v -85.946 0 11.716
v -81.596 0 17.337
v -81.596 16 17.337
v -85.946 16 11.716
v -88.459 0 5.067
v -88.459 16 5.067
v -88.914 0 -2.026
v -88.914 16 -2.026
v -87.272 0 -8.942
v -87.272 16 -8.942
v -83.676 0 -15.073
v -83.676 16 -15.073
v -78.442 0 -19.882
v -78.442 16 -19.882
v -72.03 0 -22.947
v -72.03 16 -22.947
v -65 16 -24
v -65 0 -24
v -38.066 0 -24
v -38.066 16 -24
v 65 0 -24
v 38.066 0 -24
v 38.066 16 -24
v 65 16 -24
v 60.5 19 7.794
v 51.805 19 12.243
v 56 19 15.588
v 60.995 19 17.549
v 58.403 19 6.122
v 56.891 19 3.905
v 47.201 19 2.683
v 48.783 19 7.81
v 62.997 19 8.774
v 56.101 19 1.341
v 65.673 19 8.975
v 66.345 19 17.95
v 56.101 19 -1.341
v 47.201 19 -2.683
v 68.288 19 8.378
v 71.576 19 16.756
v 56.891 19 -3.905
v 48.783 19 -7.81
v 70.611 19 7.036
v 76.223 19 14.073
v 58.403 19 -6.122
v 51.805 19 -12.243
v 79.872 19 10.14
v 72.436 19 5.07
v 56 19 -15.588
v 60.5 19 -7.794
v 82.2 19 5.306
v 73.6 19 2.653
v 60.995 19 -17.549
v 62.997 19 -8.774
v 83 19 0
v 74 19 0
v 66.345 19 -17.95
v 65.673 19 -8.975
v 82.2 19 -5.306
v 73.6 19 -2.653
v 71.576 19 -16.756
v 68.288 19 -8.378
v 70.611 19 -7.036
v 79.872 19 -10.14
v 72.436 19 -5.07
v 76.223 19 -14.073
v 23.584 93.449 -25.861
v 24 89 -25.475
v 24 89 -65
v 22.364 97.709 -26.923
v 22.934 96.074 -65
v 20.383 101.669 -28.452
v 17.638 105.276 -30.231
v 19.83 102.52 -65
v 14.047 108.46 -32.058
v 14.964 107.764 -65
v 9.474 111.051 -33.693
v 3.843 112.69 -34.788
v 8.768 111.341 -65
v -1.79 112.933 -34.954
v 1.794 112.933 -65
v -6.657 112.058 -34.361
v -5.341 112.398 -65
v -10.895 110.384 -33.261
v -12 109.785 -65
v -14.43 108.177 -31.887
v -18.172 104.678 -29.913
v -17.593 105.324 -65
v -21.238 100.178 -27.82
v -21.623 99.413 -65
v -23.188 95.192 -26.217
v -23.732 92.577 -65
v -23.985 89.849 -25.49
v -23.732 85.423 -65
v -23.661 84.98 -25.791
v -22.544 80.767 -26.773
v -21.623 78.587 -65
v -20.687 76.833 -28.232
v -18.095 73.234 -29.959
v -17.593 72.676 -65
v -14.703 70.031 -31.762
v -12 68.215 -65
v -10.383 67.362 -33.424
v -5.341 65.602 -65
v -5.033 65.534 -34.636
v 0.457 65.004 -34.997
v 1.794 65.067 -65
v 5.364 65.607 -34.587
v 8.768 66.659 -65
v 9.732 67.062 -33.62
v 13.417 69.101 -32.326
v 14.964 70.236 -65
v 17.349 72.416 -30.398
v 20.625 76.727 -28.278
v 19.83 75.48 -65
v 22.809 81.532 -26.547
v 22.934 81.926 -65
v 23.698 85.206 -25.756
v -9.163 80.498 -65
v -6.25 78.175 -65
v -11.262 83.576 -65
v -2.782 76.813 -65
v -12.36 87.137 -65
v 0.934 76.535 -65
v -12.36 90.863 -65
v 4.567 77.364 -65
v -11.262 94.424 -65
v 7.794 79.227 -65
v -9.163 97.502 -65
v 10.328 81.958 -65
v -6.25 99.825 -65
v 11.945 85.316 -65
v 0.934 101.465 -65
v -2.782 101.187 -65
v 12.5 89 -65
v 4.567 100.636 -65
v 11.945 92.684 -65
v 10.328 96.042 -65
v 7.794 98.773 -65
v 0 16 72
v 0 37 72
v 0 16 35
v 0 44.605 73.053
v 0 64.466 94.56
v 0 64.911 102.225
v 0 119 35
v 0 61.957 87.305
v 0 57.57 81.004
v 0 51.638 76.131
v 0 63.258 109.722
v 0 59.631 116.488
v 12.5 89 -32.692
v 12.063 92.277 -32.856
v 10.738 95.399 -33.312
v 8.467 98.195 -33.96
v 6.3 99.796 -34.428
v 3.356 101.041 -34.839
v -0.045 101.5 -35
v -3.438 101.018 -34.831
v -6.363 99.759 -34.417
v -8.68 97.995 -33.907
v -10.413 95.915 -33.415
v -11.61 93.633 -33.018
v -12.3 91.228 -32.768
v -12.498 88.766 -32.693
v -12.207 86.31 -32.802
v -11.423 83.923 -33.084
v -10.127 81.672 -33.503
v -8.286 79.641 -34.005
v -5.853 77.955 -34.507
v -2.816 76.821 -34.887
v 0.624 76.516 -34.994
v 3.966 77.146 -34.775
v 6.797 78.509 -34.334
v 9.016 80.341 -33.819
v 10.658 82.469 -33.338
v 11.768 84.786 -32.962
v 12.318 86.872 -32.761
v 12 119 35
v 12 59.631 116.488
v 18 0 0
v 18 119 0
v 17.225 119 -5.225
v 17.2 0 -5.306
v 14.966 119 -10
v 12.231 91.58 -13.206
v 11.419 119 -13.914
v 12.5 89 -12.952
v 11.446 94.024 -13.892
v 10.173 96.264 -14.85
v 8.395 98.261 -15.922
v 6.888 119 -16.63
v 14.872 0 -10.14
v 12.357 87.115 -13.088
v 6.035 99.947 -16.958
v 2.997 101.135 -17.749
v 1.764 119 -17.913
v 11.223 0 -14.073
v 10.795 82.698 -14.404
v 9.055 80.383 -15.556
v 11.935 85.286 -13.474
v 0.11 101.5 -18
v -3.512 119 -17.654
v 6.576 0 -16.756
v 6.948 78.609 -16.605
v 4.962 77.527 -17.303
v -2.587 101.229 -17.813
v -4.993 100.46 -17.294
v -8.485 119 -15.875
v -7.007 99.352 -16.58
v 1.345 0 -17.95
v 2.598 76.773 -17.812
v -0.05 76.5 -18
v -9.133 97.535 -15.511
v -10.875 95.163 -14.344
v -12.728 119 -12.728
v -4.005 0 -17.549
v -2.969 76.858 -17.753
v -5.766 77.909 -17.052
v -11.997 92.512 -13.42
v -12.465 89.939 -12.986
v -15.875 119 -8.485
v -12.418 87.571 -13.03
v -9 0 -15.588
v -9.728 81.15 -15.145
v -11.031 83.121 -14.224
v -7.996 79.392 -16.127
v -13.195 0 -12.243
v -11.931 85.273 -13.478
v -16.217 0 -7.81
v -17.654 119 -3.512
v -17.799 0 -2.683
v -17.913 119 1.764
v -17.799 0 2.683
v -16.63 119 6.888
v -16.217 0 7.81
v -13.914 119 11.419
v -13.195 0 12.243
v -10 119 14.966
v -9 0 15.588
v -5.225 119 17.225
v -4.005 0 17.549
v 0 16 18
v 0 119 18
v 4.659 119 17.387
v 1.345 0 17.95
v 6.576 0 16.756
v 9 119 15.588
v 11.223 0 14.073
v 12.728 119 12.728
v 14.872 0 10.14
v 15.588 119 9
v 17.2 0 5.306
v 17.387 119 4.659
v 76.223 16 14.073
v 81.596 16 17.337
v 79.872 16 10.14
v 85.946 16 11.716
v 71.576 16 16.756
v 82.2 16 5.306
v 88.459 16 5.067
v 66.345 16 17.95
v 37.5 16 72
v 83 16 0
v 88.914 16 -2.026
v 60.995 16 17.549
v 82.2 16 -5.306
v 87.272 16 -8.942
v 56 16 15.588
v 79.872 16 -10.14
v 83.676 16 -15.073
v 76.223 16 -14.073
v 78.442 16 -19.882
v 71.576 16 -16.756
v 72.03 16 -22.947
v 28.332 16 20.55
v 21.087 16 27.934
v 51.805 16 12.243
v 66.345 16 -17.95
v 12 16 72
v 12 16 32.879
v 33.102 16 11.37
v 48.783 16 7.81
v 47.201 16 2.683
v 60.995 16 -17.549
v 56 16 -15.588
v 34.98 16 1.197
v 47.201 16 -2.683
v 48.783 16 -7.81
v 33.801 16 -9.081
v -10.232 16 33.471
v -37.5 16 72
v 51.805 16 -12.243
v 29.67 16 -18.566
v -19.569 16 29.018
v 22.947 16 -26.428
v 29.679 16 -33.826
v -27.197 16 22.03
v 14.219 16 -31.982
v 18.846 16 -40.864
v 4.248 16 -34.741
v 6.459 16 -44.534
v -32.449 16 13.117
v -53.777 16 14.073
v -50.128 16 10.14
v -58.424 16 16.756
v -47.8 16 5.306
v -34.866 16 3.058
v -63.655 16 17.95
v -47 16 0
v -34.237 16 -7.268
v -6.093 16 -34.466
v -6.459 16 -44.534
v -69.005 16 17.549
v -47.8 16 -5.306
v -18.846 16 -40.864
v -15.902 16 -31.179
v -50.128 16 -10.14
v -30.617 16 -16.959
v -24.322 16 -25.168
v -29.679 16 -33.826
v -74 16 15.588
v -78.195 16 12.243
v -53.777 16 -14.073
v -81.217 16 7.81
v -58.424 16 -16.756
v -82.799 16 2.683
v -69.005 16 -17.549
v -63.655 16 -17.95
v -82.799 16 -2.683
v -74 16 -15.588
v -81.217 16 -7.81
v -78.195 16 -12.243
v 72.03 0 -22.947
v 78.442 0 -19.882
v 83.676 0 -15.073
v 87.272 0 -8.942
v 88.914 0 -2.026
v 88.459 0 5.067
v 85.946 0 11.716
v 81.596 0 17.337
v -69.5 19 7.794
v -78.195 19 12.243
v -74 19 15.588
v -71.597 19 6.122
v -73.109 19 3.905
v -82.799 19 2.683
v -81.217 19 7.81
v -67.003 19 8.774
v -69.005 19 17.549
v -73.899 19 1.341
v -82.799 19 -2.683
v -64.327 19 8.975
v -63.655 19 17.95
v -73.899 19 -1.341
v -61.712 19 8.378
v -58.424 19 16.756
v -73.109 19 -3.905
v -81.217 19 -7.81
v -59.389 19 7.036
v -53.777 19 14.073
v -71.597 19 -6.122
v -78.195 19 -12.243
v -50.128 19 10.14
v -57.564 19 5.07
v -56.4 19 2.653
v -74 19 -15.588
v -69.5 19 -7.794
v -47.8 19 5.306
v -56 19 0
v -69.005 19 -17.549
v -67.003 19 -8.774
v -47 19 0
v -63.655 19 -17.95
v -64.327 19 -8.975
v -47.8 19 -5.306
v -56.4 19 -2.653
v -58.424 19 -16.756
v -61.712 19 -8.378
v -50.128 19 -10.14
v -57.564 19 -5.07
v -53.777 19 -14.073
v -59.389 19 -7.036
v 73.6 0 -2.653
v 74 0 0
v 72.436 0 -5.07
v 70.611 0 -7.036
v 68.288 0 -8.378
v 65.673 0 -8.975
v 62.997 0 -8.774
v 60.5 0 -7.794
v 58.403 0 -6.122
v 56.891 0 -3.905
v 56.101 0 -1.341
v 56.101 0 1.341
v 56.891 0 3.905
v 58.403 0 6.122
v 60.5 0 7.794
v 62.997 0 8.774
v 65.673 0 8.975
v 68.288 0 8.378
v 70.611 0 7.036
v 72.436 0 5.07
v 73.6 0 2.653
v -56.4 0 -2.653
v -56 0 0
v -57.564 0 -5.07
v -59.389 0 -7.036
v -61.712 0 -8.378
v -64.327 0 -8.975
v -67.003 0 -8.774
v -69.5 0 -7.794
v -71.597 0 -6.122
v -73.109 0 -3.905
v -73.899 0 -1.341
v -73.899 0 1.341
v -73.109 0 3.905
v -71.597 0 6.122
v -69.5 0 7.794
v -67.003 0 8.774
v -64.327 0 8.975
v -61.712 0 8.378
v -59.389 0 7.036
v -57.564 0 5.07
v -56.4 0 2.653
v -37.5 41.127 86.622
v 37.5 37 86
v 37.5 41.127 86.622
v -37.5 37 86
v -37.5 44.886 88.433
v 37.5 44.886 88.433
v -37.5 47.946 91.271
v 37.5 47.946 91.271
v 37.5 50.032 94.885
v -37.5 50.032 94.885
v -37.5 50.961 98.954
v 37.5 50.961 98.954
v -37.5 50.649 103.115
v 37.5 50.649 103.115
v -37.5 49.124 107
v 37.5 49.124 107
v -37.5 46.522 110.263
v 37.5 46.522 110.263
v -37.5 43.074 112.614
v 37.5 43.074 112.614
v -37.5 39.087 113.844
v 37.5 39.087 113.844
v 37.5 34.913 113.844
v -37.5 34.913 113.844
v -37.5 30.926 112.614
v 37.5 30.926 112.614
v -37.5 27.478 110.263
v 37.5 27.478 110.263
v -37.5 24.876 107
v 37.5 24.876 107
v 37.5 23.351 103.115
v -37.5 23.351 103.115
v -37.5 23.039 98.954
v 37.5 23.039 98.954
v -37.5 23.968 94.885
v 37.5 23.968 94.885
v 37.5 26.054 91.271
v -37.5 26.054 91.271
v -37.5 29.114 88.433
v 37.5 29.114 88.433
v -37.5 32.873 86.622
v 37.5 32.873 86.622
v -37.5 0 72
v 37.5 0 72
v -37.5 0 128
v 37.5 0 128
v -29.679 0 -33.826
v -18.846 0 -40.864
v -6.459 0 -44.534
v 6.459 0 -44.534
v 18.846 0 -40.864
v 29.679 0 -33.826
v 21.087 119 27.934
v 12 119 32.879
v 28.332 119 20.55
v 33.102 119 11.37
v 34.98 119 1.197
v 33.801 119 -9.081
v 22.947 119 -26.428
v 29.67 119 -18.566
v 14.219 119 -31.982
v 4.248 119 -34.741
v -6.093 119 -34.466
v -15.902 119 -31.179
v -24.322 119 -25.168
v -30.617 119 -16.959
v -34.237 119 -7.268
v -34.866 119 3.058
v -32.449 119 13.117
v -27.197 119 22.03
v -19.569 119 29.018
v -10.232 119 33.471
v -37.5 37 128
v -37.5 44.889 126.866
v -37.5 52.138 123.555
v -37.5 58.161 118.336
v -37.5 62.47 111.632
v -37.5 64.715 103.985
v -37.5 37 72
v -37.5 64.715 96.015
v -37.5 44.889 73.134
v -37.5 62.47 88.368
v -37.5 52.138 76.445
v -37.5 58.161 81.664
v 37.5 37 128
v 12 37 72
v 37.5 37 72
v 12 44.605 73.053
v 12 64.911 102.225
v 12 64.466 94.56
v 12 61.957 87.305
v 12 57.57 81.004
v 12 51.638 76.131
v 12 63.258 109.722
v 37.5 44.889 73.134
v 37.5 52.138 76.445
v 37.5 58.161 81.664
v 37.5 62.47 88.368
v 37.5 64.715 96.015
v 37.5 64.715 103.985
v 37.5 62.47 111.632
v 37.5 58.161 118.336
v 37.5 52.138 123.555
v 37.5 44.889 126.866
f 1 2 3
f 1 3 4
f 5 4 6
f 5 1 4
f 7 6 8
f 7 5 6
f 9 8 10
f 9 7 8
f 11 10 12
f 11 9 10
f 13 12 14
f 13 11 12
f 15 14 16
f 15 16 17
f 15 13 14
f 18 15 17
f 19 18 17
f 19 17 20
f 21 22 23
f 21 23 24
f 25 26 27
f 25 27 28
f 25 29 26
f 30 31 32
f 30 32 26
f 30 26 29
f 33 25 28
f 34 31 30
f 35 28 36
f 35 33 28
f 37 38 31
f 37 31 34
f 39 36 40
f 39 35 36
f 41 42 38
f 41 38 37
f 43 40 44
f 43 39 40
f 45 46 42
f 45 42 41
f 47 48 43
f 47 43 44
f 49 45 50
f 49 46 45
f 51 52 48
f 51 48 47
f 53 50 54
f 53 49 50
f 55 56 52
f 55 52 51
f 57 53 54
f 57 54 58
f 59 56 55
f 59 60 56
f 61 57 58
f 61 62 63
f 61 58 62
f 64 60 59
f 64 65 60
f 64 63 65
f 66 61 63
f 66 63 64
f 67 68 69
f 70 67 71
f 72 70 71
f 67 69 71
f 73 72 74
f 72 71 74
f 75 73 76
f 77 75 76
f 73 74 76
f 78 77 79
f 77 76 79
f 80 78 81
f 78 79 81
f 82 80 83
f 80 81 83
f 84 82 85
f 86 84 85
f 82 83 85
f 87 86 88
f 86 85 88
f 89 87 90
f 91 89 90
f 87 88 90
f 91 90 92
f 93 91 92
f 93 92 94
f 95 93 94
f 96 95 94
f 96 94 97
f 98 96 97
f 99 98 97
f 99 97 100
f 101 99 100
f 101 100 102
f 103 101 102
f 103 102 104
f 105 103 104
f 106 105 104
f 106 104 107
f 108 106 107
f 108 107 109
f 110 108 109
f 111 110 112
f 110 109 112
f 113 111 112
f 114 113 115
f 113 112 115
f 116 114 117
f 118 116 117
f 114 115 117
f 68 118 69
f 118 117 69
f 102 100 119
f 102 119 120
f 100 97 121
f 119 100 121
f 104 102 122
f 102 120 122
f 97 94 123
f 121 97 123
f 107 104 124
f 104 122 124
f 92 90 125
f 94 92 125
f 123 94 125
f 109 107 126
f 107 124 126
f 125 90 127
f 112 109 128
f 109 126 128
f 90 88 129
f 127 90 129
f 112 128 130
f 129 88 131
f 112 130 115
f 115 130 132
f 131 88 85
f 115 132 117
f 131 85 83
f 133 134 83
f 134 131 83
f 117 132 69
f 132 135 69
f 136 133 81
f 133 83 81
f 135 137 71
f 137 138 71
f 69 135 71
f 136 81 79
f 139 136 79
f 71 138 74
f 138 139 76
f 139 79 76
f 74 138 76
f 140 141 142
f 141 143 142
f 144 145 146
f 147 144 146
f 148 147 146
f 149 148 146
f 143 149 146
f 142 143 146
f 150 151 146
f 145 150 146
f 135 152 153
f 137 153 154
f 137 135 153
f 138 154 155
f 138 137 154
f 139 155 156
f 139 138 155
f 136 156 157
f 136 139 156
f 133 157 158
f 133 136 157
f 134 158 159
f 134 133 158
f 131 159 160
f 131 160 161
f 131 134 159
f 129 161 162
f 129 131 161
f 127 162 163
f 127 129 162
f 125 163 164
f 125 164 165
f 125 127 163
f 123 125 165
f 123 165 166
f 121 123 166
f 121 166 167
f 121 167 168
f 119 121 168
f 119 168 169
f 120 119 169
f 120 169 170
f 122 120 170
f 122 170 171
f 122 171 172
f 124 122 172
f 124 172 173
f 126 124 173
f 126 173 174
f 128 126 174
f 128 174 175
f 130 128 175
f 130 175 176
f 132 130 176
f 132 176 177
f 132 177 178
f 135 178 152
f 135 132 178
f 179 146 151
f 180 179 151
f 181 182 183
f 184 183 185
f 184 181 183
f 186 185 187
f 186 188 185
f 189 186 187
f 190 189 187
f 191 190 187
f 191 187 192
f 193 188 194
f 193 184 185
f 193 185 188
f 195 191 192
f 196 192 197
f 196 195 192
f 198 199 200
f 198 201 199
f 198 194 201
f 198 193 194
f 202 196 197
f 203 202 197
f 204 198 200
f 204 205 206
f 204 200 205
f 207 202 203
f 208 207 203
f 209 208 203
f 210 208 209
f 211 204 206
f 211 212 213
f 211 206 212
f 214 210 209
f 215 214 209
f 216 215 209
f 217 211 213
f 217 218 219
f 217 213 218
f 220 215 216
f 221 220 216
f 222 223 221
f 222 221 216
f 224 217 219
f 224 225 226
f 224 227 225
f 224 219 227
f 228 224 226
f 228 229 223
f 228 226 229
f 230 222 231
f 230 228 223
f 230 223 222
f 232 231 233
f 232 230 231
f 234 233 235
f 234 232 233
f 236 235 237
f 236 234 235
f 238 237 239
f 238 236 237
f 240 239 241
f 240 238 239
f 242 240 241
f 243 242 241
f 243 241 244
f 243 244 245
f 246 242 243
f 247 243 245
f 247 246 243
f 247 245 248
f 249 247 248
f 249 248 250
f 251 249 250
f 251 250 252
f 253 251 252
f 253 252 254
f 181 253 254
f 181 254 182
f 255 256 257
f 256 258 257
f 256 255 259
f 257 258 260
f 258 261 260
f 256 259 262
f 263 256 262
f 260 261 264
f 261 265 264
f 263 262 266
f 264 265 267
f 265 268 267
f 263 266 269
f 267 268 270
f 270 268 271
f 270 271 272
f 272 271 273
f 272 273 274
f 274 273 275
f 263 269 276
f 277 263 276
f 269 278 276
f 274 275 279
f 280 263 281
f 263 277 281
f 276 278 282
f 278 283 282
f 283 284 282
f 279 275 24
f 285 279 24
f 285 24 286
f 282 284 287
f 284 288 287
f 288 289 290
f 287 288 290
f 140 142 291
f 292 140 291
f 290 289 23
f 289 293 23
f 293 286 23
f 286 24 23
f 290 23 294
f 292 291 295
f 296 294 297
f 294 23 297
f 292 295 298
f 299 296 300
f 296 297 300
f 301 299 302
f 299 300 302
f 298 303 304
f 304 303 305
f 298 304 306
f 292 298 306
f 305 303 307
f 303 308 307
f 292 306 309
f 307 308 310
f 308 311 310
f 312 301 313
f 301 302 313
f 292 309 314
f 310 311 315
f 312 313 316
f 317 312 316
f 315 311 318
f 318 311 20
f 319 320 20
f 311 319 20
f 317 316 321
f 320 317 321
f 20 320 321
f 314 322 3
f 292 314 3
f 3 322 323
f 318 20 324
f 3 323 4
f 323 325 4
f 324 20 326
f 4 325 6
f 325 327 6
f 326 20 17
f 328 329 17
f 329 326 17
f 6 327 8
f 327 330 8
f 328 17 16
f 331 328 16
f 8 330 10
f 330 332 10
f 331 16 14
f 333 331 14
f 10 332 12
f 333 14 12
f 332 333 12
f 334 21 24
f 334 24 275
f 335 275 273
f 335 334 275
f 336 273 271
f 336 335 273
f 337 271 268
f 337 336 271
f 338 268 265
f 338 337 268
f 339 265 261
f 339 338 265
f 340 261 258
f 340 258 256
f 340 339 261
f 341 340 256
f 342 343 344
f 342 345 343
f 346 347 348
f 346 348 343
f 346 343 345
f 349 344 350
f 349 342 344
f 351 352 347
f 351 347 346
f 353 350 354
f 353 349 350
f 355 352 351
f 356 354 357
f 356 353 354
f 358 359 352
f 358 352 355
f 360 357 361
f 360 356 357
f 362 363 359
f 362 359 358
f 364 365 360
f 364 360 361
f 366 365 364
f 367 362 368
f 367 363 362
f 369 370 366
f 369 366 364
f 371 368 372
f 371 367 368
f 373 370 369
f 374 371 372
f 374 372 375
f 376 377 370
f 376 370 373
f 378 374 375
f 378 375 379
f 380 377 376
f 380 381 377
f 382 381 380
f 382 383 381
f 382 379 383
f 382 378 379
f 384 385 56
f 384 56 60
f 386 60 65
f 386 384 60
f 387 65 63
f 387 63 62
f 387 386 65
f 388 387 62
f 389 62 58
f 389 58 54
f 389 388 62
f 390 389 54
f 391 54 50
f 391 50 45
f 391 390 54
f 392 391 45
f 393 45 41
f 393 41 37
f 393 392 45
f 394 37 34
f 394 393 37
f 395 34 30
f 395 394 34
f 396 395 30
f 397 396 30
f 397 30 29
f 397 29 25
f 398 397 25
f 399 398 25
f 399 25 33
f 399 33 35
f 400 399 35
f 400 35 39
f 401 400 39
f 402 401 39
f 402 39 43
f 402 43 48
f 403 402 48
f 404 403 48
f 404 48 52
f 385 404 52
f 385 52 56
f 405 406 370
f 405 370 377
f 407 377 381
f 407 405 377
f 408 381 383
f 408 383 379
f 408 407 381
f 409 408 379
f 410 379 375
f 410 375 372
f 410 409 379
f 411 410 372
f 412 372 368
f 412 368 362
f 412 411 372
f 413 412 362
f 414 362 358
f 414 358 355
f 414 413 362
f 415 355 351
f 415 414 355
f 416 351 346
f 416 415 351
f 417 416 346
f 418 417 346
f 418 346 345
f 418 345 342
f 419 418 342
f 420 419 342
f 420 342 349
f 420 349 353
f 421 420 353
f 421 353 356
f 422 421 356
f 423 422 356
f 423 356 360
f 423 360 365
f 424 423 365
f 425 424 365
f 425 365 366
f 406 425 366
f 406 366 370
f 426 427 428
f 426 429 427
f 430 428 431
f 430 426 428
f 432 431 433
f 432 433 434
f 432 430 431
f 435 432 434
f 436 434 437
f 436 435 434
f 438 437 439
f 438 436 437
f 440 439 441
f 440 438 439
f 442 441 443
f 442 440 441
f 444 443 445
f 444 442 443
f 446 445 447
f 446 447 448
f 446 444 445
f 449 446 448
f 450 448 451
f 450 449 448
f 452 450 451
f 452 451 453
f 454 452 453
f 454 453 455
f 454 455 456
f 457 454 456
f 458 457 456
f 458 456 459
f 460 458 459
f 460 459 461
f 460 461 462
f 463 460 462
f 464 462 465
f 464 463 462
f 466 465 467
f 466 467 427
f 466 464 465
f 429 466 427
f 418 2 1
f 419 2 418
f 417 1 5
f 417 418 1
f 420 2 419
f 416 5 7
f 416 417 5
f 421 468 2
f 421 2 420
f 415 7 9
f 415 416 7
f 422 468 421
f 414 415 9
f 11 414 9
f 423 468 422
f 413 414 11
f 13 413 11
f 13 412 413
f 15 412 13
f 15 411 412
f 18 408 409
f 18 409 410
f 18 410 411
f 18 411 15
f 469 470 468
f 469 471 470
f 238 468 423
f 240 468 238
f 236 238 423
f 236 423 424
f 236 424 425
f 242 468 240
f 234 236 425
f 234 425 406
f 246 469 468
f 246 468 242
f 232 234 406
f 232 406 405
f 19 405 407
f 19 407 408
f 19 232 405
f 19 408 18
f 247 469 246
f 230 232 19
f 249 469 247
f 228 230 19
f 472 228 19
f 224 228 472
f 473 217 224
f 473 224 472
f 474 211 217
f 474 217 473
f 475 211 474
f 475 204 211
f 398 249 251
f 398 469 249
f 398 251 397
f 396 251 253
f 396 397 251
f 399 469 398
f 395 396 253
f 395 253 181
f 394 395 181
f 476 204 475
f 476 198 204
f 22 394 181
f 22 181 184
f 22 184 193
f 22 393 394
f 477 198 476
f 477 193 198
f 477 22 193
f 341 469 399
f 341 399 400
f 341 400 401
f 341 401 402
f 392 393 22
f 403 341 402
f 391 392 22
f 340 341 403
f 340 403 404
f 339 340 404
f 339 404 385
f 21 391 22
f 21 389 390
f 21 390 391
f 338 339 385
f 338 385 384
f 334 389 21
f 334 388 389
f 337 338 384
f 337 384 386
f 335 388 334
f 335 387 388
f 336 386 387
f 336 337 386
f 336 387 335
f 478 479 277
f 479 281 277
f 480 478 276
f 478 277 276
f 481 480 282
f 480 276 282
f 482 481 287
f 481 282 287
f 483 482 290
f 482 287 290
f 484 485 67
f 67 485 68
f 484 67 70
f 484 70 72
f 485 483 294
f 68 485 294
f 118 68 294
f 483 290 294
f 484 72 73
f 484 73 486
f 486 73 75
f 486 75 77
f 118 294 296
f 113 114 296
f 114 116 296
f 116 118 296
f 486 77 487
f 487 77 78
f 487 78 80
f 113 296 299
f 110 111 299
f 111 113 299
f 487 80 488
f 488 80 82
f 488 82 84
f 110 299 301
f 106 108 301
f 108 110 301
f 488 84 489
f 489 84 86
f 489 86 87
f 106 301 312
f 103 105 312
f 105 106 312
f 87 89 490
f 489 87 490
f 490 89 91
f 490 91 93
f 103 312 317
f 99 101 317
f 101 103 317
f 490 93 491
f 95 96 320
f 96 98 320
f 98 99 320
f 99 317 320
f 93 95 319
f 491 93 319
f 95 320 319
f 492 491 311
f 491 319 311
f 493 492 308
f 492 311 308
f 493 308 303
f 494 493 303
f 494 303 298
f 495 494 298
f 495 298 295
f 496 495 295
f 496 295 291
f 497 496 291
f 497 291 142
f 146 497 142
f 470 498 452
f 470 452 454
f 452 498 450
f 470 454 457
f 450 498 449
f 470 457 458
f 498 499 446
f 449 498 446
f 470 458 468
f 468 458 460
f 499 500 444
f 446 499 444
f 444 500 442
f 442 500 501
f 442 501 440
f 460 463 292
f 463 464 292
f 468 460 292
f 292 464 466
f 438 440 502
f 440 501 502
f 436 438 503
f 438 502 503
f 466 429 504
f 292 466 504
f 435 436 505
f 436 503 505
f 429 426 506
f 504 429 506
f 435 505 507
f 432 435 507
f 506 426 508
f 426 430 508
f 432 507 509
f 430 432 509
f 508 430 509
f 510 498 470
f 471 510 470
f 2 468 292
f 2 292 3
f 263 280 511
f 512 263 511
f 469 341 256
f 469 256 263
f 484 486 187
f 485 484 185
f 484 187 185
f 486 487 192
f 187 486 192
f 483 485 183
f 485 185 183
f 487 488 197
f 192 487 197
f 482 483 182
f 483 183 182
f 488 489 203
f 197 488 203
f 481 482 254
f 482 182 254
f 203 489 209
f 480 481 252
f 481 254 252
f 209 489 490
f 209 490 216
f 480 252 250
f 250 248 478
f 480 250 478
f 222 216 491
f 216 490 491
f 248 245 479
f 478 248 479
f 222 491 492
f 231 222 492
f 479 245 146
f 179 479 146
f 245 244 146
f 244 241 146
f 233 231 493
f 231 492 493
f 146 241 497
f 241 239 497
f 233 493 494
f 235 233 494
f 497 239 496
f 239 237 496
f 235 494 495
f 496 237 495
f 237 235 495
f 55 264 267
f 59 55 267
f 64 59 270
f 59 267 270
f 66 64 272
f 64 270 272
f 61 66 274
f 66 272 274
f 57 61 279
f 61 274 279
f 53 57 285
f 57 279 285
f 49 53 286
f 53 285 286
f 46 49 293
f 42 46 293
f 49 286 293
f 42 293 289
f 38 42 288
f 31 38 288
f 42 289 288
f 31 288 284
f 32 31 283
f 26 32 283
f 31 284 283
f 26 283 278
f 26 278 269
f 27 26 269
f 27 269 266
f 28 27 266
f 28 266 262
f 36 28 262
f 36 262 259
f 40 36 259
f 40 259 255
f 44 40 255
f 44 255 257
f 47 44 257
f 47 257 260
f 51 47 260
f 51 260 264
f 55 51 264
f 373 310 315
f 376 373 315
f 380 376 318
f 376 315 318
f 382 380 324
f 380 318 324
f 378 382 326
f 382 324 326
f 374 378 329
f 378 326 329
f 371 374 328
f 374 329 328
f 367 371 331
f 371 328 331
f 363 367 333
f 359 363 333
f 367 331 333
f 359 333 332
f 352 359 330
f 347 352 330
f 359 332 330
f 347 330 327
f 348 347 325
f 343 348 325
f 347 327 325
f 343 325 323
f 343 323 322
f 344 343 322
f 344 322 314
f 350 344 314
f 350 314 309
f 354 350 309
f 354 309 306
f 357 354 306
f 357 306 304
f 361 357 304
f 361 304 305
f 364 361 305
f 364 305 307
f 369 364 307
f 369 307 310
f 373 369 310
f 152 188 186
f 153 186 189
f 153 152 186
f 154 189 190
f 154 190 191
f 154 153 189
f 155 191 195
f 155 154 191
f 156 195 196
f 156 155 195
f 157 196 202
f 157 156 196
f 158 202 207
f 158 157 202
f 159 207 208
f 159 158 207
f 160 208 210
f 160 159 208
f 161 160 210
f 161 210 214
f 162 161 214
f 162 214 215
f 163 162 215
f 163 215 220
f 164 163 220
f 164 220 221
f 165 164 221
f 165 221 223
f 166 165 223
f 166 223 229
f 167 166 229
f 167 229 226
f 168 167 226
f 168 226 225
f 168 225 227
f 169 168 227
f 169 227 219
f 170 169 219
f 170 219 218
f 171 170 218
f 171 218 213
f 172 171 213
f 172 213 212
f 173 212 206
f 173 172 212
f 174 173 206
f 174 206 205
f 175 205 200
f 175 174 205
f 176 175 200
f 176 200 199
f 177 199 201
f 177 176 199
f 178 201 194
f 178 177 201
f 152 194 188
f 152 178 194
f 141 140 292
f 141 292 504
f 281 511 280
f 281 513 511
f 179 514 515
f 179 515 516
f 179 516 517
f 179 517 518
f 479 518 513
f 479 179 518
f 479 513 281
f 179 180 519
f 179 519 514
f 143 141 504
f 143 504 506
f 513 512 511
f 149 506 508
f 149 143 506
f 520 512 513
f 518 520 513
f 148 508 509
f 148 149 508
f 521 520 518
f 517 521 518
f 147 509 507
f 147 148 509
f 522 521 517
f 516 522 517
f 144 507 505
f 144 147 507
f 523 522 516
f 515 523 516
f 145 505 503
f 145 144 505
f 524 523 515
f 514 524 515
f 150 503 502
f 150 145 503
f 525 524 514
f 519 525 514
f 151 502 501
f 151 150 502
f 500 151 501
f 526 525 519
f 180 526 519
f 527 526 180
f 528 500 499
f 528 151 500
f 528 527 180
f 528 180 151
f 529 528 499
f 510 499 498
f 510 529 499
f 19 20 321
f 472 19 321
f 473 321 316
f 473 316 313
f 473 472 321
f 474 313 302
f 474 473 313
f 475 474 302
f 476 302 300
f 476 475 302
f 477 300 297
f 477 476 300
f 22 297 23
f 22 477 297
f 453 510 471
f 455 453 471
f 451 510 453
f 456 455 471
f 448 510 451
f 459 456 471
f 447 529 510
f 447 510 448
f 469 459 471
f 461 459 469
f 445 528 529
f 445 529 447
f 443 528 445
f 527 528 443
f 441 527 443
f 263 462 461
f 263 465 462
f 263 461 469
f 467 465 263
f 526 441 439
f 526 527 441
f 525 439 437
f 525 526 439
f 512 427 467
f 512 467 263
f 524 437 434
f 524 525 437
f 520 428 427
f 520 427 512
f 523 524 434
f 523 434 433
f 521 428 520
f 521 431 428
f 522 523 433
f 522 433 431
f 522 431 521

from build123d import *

# Parameters (mm, degrees)
CROQUIS2_R              = 18
CROQUIS2_R_2            = 9
SALIENTE_EXTRUIR1_DEPTH = 16
CROQUIS3_R              = 18
CROQUIS3_R_2            = 9
SALIENTE_EXTRUIR2_DEPTH = 19
CROQUIS4_R              = 35
CROQUIS4_R_2            = 18
SALIENTE_EXTRUIR3_DEPTH = 119
CROQUIS5_R              = 14
SALIENTE_EXTRUIR4_DEPTH = 37.5
SALIENTE_EXTRUIR5_DEPTH = 12
SALIENTE_EXTRUIR6_REACH = 195
CROQUIS7_R              = 24
CROQUIS7_R_2            = 12.5
CORTAR_EXTRUIR1_REACH   = 195
CROQUIS8_R              = 12.5


with BuildPart() as part:
    # Croquis2 → Saliente-Extruir1 (new body)
    with BuildSketch(Plane(origin=(0, 0, 0), x_dir=(1, 0, 0), z_dir=(0, 1, 0))):
        with BuildLine():
            Line((-65, 24), (-38.065732621, 24))
            ThreePointArc((-38.065732621, 24), (0, 45), (38.065732621, 24))
            Line((38.065732621, 24), (65, 24))
            ThreePointArc((65, 24), (87.272092101, 8.941695223), (81.595854962, -17.337173878))
            Line((81.595854962, -17.337173878), (37.5, -72))
            Line((37.5, -72), (-37.5, -72))
            Line((-37.5, -72), (-81.595854962, -17.337173878))
            ThreePointArc((-81.595854962, -17.337173878), (-87.272092101, 8.941695223), (-65, 24))
        make_face()
        Circle(CROQUIS2_R, mode=Mode.SUBTRACT)
        with Locations((65, 0)):
            Circle(CROQUIS2_R_2, mode=Mode.SUBTRACT)
        with Locations((-65, 0)):
            Circle(CROQUIS2_R_2, mode=Mode.SUBTRACT)
    extrude(amount=SALIENTE_EXTRUIR1_DEPTH)

    # Croquis3 → Saliente-Extruir2 (add)
    with BuildSketch(Plane(origin=(0, 0, 0), x_dir=(1, 0, 0), z_dir=(0, 1, 0))):
        with Locations((65, 0)):
            Circle(CROQUIS3_R)
        with Locations((65, 0)):
            Circle(CROQUIS3_R_2, mode=Mode.SUBTRACT)
        with Locations((-65, 0)):
            Circle(CROQUIS3_R)
        with Locations((-65, 0)):
            Circle(CROQUIS3_R_2, mode=Mode.SUBTRACT)
    extrude(amount=SALIENTE_EXTRUIR2_DEPTH)

    # Croquis4 → Saliente-Extruir3 (add)
    with BuildSketch(Plane(origin=(0, 0, 0), x_dir=(1, 0, 0), z_dir=(0, 1, 0))):
        Circle(CROQUIS4_R)
        Circle(CROQUIS4_R_2, mode=Mode.SUBTRACT)
    extrude(amount=SALIENTE_EXTRUIR3_DEPTH)

    # Croquis5 → Saliente-Extruir4 (add, symmetric)
    with BuildSketch(Plane(origin=(0, 0, 0), x_dir=(0, 0, -1), z_dir=(1, 0, 0))):
        with BuildLine():
            Line((-72, 0), (-72, 37))
            ThreePointArc((-72, 37), (-100, 65), (-128, 37))
            Line((-128, 37), (-128, 0))
            Line((-128, 0), (-72, 0))
        make_face()
        with Locations((-100, 37)):
            Circle(CROQUIS5_R, mode=Mode.SUBTRACT)
    extrude(amount=SALIENTE_EXTRUIR4_DEPTH, both=True)

    # Croquis6 → Saliente-Extruir5 (add)
    with BuildSketch(Plane(origin=(0, 0, 0), x_dir=(0, 0, -1), z_dir=(1, 0, 0))):
        with BuildLine():
            Line((-72, 16), (-18, 16))
            Line((-18, 16), (-18, 119))
            Line((-18, 119), (-35, 119))
            Line((-35, 119), (-116.487939559, 59.630683797))
            ThreePointArc((-116.487939559, 59.630683797), (-87.304770732, 61.95658538), (-72, 37))
            Line((-72, 37), (-72, 16))
        make_face()
    extrude(amount=SALIENTE_EXTRUIR5_DEPTH)

    # Croquis7 → Saliente-Extruir6 (add, up to next)
    with BuildSketch(Plane.XY.offset(-65), mode=Mode.PRIVATE) as saliente_extruir6_sk1:
        with Locations((0, 89)):
            Circle(CROQUIS7_R)
        with Locations((0, 89)):
            Circle(CROQUIS7_R_2, mode=Mode.SUBTRACT)
    saliente_extruir6_tool1 = extrude(saliente_extruir6_sk1.sketch, amount=SALIENTE_EXTRUIR6_REACH, mode=Mode.PRIVATE) - part.part
    add(saliente_extruir6_tool1.solids().sort_by_distance((-23.321177, 89, -65))[0])

    # Croquis8 → Cortar-Extruir1 (cut, up to next)
    with BuildSketch(Plane.XY.offset(-65), mode=Mode.PRIVATE) as cortar_extruir1_sk1:
        with Locations((0, 89)):
            Circle(CROQUIS8_R)
    cortar_extruir1_tool1 = extrude(cortar_extruir1_sk1.sketch, amount=CORTAR_EXTRUIR1_REACH, mode=Mode.PRIVATE) & part.part
    add(cortar_extruir1_tool1.solids().sort_by_distance((0, 89, -65))[0], mode=Mode.SUBTRACT)


solid = part.part
